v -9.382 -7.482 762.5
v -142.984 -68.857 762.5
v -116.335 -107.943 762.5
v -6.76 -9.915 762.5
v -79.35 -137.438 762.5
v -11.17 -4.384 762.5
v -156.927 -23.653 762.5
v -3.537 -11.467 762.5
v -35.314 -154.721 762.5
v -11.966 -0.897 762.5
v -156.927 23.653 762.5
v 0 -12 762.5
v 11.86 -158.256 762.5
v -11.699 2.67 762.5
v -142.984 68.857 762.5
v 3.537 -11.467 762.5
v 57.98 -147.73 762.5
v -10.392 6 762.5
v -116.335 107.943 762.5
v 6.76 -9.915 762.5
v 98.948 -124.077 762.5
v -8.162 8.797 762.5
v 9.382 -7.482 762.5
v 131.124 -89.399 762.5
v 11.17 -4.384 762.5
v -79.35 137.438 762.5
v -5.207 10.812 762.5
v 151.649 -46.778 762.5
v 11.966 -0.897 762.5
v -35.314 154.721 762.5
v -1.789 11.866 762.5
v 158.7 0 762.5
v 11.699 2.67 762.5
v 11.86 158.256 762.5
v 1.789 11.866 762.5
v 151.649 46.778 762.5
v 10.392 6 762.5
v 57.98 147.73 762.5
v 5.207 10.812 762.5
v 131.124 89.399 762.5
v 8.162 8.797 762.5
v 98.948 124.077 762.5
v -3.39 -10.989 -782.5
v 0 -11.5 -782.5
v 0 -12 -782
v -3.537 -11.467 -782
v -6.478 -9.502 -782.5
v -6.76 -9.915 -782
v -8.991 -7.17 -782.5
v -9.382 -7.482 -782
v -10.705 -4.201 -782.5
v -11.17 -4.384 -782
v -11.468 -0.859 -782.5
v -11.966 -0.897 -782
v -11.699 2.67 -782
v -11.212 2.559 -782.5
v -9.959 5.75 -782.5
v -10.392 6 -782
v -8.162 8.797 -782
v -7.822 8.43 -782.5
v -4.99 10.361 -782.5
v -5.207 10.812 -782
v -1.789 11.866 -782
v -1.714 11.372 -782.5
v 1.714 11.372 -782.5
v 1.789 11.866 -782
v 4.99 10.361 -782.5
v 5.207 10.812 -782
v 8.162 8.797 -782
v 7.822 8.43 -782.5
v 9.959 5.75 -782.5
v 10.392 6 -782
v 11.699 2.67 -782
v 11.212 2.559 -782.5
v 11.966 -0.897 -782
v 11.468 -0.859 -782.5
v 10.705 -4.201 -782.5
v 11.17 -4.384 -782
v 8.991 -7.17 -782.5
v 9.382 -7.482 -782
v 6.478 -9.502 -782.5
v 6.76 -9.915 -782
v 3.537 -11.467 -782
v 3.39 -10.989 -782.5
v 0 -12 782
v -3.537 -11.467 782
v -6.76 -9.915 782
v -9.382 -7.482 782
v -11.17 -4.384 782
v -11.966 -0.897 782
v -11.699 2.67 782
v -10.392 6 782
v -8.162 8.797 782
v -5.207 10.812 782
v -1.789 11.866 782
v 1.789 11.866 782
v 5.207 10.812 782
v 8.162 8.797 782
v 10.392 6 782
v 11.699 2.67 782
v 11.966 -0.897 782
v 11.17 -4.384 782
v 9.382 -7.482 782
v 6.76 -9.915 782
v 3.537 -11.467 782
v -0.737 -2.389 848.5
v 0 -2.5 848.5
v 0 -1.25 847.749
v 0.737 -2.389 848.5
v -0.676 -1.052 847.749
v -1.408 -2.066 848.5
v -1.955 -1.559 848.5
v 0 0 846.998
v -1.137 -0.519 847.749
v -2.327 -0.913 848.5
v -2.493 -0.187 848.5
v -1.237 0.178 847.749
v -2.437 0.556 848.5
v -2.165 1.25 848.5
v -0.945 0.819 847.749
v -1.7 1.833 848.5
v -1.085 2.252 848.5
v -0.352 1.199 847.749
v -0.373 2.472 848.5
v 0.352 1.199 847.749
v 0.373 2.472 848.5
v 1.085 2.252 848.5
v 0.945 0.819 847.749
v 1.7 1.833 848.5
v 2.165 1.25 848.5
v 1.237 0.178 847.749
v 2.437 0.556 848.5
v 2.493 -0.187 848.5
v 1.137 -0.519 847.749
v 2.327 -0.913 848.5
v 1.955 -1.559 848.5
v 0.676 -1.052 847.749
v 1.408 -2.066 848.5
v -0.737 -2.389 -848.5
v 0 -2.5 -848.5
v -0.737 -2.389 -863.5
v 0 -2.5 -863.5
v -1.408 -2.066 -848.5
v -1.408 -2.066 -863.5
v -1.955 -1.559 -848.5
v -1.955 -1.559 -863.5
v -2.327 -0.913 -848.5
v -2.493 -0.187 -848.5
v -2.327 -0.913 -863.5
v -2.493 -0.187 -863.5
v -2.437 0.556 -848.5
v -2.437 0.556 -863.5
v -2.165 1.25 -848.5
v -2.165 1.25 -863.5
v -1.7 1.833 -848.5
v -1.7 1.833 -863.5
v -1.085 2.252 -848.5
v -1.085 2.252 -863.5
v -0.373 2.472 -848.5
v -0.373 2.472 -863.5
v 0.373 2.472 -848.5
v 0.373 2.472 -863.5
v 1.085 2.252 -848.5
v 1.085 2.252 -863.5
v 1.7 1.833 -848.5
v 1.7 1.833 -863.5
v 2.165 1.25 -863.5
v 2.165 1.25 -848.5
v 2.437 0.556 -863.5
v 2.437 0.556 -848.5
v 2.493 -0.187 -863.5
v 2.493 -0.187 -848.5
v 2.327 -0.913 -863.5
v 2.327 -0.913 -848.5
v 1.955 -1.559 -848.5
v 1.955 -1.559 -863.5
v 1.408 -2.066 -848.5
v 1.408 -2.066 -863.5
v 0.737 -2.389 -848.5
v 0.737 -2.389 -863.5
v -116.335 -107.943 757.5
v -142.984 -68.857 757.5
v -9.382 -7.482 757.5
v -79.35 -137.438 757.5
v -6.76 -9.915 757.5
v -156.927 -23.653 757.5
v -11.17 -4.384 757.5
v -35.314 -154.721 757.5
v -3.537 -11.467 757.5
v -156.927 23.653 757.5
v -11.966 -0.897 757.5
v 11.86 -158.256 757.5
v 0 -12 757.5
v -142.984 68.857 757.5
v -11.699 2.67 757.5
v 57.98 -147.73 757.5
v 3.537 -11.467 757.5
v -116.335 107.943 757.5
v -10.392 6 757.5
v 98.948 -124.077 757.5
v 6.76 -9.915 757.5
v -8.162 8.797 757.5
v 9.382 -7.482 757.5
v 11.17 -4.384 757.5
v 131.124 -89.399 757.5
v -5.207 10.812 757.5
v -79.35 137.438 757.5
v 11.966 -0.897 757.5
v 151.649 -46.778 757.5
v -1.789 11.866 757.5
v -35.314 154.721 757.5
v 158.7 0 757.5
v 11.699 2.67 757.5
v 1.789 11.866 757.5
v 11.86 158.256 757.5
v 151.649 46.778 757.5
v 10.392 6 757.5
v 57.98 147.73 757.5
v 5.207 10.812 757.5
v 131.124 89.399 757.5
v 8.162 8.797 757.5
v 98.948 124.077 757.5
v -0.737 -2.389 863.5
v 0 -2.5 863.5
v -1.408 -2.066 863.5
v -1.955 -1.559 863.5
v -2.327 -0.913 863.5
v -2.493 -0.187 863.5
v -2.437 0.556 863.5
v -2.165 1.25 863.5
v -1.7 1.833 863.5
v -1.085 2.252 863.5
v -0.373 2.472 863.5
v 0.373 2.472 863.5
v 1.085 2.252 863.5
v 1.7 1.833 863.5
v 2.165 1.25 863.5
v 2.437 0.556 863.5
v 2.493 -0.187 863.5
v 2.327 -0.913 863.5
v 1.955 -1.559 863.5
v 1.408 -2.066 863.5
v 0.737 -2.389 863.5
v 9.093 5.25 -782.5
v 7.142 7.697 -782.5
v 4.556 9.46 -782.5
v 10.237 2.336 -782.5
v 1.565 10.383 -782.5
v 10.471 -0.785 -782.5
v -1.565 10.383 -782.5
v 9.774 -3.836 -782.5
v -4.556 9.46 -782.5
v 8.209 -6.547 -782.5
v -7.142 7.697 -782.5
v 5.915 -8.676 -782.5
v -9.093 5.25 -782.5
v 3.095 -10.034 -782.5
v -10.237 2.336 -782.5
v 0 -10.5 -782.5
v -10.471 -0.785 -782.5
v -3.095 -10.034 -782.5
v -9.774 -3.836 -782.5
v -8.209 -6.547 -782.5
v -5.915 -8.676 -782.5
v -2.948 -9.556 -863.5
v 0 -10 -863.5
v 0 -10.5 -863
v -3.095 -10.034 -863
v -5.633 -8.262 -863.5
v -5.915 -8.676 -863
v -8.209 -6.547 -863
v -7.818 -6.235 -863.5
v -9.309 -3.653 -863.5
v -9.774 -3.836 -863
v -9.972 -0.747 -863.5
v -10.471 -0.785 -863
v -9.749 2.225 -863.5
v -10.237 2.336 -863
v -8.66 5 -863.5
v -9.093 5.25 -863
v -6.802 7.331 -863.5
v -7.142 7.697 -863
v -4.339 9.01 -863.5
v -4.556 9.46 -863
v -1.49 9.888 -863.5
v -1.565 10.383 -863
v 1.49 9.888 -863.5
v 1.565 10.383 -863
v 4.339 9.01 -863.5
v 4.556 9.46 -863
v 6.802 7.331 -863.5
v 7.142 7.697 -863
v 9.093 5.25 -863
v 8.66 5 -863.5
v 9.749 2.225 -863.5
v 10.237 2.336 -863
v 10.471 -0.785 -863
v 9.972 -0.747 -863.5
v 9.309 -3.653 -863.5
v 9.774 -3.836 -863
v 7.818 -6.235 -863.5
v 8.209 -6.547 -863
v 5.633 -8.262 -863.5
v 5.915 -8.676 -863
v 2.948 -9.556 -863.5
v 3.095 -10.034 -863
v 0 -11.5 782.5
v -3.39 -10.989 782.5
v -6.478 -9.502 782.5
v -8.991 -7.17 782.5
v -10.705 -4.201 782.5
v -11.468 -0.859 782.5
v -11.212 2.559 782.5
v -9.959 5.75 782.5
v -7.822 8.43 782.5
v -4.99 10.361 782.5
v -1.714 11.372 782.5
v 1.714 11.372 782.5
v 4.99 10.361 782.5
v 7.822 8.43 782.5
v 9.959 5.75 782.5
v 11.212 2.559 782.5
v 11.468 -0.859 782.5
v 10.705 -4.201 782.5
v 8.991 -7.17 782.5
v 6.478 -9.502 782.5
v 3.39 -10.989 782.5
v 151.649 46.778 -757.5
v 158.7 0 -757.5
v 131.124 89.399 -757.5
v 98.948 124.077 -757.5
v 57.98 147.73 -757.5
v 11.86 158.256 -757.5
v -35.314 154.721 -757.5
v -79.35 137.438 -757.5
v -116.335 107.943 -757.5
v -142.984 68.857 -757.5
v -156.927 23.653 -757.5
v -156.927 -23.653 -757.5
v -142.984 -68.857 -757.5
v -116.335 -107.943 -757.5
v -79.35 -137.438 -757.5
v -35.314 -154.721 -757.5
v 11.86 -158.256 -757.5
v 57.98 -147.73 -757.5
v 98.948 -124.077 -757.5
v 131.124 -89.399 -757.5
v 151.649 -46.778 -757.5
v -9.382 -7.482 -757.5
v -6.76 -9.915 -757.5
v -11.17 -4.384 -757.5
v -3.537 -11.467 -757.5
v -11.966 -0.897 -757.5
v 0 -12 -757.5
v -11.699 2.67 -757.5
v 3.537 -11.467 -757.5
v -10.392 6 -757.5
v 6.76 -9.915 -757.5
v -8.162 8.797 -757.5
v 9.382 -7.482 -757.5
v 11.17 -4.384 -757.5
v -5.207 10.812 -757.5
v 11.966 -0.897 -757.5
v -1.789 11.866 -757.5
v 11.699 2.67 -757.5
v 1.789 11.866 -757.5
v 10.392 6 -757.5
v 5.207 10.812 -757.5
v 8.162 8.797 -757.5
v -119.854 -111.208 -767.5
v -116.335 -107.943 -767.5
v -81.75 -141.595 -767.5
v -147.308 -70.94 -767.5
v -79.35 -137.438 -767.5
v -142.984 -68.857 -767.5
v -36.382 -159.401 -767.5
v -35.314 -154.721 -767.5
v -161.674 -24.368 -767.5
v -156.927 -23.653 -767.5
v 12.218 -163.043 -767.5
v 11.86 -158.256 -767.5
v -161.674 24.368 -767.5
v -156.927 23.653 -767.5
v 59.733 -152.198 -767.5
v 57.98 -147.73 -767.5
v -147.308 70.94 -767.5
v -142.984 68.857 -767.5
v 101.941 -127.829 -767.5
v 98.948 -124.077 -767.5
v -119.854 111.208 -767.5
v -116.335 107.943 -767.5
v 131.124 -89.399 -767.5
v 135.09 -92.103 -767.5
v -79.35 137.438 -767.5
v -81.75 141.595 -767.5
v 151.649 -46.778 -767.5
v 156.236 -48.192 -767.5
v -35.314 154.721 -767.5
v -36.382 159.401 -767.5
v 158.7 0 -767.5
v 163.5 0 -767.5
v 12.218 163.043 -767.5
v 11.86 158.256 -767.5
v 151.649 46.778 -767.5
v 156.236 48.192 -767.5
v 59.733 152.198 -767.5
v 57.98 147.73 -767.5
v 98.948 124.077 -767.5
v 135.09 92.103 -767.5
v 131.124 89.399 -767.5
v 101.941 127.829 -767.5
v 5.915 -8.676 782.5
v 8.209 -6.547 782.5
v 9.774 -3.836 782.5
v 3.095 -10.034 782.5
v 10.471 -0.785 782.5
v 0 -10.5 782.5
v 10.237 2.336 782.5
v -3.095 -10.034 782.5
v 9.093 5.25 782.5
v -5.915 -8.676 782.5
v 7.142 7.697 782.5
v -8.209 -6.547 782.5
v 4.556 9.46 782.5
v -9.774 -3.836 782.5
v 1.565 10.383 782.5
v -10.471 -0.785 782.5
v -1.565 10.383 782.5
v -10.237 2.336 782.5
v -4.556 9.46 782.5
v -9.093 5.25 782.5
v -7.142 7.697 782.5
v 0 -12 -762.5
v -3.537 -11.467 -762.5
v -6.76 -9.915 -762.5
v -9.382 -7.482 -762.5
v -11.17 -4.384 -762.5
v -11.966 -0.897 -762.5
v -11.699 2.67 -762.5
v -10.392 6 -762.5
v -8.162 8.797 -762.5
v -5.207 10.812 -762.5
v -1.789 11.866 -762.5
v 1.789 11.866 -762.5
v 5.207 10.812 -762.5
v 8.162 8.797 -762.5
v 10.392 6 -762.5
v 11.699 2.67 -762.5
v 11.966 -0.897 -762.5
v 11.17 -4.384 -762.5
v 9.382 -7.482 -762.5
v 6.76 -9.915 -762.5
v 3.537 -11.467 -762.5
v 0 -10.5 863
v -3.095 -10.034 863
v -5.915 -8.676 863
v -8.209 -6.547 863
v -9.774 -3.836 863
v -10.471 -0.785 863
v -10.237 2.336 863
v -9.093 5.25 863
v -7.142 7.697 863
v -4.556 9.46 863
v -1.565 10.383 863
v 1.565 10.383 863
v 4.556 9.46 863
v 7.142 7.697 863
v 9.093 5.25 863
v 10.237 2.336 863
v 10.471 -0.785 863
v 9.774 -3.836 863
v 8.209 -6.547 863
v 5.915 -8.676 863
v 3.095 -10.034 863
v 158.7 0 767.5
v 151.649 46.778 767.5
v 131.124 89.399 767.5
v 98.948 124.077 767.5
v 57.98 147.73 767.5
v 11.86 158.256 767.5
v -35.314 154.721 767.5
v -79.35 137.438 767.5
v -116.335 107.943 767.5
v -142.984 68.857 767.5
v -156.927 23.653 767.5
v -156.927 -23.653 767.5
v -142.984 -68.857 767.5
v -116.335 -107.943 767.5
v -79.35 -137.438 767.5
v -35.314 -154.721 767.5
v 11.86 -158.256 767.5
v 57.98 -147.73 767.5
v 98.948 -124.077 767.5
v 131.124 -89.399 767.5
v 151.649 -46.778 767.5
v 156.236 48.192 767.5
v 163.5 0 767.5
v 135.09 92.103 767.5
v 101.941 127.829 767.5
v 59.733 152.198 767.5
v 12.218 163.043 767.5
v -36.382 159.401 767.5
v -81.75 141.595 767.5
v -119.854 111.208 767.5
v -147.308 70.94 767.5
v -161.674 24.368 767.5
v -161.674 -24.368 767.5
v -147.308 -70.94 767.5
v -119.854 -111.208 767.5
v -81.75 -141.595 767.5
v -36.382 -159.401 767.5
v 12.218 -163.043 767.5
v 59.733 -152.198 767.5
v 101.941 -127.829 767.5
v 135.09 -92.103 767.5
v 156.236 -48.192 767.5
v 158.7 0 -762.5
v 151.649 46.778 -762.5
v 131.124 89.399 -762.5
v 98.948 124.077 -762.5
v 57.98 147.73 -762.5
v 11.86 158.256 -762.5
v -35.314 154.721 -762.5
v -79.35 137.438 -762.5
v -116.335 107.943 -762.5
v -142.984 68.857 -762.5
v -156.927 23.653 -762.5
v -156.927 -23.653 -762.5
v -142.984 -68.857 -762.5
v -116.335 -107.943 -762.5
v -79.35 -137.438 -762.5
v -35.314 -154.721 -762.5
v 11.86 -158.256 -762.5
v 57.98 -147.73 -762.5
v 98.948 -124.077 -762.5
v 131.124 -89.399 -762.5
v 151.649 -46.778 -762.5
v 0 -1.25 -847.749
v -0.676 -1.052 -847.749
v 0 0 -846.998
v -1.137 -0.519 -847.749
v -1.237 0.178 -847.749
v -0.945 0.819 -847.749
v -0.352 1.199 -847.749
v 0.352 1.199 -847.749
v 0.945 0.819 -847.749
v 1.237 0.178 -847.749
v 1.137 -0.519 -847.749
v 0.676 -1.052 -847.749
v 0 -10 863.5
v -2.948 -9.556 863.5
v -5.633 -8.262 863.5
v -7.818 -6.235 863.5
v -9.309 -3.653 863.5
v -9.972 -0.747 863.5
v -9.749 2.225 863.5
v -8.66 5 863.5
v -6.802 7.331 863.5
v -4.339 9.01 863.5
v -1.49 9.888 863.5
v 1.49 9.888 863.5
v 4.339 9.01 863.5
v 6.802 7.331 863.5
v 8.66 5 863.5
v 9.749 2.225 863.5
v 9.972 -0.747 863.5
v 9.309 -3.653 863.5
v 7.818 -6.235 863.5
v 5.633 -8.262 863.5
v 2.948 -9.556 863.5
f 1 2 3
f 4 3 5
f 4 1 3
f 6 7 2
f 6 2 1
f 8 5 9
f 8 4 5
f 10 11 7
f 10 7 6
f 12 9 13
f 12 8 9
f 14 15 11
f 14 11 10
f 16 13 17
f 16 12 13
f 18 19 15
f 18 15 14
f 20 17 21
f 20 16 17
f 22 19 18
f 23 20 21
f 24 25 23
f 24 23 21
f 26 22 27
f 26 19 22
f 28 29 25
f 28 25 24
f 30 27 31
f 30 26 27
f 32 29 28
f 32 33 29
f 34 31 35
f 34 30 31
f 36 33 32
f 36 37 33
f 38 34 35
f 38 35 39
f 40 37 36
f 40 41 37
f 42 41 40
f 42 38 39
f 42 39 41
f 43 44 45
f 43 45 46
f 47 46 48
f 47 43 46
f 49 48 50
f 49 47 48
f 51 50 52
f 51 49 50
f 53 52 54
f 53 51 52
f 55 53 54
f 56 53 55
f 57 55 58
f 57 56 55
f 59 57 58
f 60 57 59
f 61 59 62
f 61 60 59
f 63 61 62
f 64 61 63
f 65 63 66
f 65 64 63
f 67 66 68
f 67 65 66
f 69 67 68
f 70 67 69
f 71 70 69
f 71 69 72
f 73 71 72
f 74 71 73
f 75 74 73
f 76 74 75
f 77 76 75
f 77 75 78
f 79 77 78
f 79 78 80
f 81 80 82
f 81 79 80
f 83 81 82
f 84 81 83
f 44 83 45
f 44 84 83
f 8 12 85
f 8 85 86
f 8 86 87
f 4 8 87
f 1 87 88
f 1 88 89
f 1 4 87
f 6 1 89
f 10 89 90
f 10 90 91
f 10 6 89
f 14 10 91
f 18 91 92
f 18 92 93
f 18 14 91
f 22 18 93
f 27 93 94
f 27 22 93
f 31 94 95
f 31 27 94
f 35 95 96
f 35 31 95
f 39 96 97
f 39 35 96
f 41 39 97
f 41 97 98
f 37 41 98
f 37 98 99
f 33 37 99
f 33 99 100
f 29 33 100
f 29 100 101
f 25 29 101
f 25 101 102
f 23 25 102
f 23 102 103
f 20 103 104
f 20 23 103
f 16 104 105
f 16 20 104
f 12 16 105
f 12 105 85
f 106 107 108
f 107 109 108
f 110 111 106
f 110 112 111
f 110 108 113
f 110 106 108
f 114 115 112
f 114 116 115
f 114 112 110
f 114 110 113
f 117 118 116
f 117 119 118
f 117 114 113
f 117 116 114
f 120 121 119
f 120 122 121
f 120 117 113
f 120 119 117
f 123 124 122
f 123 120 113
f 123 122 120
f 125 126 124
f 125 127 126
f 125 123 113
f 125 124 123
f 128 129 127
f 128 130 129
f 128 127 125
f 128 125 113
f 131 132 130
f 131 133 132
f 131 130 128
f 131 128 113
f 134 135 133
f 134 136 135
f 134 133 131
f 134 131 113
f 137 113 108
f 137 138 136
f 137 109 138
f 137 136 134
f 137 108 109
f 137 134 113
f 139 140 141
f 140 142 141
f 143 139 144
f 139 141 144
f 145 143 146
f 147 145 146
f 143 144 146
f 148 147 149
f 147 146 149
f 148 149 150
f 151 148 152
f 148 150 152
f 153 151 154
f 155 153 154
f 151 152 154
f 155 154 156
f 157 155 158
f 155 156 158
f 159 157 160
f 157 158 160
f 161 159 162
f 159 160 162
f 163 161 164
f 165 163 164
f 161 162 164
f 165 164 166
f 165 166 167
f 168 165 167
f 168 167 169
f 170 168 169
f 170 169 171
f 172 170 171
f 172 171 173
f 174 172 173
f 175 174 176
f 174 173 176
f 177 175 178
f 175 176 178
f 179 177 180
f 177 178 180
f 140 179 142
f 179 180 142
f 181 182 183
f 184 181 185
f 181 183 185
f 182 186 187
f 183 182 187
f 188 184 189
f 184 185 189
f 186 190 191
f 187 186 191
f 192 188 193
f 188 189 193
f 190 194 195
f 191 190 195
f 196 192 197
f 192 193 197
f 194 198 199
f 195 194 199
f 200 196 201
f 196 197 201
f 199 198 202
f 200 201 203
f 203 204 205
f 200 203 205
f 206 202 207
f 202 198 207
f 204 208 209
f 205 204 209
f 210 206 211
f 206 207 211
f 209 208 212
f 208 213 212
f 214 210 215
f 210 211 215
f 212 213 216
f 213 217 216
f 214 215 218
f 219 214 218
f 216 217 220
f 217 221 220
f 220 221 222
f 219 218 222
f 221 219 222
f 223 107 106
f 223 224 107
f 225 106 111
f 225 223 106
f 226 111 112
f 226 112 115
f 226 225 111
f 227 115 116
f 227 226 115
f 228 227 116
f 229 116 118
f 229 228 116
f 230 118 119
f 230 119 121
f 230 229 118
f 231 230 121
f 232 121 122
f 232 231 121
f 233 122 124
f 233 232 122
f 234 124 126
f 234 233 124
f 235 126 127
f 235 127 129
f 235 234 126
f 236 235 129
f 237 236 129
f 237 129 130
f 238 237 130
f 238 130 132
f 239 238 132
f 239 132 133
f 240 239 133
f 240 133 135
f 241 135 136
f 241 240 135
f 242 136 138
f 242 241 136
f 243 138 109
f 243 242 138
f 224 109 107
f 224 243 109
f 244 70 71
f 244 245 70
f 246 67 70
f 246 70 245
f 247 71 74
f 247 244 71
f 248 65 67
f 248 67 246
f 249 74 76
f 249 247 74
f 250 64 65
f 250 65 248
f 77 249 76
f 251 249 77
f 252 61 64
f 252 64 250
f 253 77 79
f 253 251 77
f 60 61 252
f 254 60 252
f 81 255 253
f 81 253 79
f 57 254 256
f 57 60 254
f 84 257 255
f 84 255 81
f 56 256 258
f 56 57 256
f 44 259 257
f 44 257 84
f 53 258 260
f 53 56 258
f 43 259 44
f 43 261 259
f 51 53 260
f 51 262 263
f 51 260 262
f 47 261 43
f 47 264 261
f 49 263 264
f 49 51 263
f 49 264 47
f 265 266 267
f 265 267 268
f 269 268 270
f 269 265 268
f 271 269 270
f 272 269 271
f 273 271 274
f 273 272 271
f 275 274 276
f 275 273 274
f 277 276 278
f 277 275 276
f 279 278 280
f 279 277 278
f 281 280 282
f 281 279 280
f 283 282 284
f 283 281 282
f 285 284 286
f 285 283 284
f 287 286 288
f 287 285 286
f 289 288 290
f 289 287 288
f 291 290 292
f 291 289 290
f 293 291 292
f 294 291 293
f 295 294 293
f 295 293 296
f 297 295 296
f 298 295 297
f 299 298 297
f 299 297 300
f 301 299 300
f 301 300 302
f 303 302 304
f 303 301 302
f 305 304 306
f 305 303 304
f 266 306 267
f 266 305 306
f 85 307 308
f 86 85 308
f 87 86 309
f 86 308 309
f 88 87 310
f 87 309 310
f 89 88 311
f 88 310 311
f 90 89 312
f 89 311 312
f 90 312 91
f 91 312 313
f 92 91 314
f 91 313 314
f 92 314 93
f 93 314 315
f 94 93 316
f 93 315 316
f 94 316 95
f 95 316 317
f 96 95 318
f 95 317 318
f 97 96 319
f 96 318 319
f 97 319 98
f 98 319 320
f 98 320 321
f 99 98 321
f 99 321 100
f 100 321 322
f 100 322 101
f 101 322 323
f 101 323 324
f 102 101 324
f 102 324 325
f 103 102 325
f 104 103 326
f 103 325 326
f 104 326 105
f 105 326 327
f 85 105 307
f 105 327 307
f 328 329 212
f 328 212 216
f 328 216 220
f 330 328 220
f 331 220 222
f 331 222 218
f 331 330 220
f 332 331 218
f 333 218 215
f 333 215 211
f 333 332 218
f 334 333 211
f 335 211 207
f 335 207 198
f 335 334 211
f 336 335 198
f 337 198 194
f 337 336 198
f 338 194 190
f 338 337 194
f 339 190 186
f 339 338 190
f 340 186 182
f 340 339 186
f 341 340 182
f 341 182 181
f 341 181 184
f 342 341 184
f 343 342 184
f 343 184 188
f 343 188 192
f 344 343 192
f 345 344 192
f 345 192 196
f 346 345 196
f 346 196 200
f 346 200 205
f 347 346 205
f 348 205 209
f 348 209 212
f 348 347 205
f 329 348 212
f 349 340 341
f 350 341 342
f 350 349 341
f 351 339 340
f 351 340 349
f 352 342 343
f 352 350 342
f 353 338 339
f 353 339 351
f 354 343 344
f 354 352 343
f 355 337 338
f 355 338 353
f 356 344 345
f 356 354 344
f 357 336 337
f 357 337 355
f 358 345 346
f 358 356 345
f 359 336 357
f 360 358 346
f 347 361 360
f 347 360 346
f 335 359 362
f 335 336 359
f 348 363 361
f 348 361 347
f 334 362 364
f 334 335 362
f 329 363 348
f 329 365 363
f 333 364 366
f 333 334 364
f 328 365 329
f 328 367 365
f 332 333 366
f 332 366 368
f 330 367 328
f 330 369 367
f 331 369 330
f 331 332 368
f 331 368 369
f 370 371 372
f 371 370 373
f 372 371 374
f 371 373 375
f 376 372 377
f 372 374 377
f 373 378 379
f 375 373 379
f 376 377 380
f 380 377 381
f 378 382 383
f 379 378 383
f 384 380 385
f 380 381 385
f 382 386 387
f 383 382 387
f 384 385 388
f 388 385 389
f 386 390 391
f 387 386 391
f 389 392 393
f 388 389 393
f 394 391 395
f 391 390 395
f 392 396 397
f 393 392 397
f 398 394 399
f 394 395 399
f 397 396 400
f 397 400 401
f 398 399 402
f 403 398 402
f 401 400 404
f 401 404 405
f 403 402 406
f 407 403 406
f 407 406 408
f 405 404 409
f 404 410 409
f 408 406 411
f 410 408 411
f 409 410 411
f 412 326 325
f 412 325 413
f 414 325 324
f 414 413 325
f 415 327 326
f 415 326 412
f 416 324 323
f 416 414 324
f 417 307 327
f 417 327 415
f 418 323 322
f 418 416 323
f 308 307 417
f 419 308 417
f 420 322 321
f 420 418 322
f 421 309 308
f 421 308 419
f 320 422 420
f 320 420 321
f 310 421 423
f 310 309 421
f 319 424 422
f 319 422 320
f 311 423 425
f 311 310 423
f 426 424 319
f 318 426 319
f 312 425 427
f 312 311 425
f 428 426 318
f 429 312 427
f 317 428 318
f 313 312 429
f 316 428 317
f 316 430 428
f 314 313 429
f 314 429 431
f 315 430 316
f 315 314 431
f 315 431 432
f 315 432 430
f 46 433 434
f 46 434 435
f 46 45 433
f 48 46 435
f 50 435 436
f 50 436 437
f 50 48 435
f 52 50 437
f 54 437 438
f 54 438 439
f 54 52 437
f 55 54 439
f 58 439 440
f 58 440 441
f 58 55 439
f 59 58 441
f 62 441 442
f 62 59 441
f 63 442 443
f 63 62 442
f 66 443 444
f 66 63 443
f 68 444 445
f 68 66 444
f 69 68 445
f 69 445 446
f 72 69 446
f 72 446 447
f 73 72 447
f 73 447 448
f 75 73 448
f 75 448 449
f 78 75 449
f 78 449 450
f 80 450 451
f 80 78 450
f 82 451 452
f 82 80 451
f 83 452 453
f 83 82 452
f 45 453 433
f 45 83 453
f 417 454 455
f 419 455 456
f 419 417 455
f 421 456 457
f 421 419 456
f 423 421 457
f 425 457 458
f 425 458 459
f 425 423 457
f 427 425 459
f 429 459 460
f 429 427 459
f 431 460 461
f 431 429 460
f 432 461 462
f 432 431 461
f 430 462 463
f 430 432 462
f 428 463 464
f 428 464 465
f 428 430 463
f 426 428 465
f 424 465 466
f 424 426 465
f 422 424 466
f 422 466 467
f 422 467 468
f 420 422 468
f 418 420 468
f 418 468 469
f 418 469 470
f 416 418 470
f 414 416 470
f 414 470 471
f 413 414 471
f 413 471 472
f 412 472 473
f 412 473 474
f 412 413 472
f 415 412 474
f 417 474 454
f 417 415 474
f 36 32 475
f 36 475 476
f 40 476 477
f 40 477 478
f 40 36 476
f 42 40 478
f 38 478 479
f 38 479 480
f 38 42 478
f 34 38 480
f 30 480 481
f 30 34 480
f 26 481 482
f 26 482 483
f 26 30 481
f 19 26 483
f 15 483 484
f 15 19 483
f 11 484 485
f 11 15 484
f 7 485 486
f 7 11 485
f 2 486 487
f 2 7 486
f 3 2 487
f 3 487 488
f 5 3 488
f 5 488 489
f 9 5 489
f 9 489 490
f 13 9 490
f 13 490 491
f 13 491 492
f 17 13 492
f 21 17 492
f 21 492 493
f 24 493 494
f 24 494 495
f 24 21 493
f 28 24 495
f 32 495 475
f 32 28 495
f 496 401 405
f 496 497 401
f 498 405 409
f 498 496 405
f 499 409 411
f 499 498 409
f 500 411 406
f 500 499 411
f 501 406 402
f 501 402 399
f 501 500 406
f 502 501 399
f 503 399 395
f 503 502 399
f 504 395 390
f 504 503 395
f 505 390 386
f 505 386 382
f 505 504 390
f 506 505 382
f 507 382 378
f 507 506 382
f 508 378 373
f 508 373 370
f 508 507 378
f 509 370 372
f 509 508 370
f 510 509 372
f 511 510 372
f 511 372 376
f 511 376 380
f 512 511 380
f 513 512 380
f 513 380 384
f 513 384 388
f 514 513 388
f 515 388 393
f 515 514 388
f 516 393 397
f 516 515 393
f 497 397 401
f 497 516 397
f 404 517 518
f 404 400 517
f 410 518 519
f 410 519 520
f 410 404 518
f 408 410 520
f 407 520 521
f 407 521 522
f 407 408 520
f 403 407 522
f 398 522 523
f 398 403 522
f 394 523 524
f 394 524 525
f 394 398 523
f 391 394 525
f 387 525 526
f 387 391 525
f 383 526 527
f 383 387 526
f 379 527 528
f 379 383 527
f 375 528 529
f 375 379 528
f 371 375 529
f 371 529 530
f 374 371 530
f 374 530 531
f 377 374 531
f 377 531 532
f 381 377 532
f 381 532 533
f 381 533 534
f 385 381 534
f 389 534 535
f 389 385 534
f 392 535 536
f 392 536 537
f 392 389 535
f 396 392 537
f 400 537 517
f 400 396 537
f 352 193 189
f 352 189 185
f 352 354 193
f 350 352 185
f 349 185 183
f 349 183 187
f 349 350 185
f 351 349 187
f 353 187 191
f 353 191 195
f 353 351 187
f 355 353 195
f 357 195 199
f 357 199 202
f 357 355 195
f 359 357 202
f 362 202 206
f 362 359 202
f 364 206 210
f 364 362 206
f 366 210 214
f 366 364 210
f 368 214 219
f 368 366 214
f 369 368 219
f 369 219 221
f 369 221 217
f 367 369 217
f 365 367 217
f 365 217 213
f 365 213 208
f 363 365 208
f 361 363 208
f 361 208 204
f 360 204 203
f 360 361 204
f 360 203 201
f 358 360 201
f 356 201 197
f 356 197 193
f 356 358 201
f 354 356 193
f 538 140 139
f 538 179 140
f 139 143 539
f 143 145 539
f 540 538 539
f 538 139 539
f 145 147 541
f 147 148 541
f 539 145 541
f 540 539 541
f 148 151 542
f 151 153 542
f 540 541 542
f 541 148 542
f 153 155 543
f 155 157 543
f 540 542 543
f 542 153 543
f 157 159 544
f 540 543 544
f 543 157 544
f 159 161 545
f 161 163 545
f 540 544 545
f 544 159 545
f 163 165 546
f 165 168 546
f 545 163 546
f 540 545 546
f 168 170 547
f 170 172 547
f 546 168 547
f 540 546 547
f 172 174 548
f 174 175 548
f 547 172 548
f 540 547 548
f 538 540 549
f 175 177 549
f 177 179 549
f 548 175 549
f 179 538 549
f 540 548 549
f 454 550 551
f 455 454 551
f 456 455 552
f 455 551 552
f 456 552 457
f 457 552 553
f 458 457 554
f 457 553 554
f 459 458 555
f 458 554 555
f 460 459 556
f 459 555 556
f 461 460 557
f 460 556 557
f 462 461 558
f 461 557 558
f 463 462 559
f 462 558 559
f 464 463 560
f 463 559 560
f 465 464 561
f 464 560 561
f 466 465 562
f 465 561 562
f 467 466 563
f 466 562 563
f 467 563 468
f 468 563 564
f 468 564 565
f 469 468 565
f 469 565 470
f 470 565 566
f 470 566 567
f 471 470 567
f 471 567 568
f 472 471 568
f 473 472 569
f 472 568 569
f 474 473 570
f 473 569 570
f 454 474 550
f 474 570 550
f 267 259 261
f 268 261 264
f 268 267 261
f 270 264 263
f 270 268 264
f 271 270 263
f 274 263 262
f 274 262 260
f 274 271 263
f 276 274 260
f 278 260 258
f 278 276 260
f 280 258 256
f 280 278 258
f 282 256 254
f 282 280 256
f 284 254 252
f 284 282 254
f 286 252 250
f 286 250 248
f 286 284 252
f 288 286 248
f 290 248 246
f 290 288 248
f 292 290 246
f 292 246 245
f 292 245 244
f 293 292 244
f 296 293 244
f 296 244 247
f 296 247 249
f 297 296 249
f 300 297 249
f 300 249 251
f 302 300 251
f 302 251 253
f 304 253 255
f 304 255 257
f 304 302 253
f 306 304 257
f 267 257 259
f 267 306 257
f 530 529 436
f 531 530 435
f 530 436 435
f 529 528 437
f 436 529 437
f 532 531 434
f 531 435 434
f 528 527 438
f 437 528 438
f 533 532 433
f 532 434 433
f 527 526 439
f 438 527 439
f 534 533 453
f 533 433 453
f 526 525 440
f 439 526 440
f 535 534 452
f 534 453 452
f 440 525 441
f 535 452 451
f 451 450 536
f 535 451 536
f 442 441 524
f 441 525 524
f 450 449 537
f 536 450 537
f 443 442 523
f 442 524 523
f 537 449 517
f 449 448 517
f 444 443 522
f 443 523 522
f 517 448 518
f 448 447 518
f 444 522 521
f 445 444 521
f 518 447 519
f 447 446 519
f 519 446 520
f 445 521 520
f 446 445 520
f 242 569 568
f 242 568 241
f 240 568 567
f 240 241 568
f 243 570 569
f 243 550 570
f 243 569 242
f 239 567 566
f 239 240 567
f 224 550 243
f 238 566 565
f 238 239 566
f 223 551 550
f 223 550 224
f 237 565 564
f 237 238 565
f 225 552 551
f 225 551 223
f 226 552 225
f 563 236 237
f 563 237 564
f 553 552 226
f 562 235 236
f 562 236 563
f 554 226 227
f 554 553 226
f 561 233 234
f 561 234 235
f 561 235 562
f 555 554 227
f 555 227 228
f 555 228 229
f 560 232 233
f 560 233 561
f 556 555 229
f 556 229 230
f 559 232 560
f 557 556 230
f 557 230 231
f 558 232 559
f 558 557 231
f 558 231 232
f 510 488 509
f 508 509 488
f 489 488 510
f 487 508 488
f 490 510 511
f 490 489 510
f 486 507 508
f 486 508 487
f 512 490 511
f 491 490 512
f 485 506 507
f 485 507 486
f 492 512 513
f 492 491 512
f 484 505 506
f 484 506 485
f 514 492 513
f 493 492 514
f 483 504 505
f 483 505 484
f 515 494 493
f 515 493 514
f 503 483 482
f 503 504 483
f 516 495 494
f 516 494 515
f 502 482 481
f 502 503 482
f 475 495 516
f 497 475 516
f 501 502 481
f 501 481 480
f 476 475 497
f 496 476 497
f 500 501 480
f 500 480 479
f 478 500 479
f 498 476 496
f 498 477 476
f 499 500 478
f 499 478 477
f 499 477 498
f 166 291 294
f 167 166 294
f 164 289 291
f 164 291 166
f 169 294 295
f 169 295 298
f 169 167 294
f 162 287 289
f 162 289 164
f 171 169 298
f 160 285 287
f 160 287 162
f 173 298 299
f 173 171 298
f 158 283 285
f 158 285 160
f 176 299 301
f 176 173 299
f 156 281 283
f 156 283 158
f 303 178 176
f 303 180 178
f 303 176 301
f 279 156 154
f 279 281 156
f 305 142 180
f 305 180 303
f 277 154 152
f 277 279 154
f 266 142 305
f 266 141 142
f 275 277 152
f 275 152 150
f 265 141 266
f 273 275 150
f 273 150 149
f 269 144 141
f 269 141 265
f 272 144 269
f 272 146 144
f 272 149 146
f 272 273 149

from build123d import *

# Parameters (mm, degrees)
SKETCH1_R           = 163.5
SKETCH1_R_2         = 158.7
BOSS_EXTRUDE1_DEPTH = 767.5
BOSS_EXTRUDE2_START = -10
SKETCH2_R           = 158.7
BOSS_EXTRUDE2_DEPTH = 5
CHAMFER1_SIZE       = 0.5


with BuildPart() as part:
    # Sketch1 → Boss-Extrude1 (new, symmetric)
    with BuildSketch(Plane.XY):
        Circle(SKETCH1_R)
        Circle(SKETCH1_R_2, mode=Mode.SUBTRACT)
    extrude(amount=BOSS_EXTRUDE1_DEPTH, both=True)

    # Sketch2 → Boss-Extrude2 (add)
    with BuildSketch(Plane.XY.offset(767.5).offset(BOSS_EXTRUDE2_START)):
        Circle(SKETCH2_R)
    boss_extrude2 = extrude(amount=BOSS_EXTRUDE2_DEPTH)

    # Sketch5 → Revolve1 (revolve)
    with BuildSketch(Plane(origin=(0, 0, 0), x_dir=(0, 0, -1), z_dir=(1, 0, 0)), mode=Mode.PRIVATE) as revolve1_sk:
        Polygon((-782.5, 12), (782.5, 12), (782.5, 10.5), (863.5, 10.5), (863.5, 0), (-863.5, 0), (-863.5, 10.5), (-782.5, 10.5), align=None)
    revolve(revolve1_sk.sketch.rotate(Axis((0, 0, -863.5), (0, 0, -1)), 180), axis=Axis((0, 0, -863.5), (0, 0, -1)))

    # Chamfer1
    chamfer1_edges = [part.edges().sort_by_distance(p)[0] for p in [
        (0, 12, -782.5),
        (0, 12, 782.5),
        (0, 10.5, -863.5),
        (0, 10.5, 863.5),
    ]]
    chamfer(chamfer1_edges, length=CHAMFER1_SIZE)

    # Sketch7 → M6 Tapped Hole1 (revolve, cut)
    with BuildSketch(Plane(origin=(0, 0, 863.5), x_dir=(0, -1, 0), z_dir=(1, 0, 0))):
        Polygon((0, 0), (0, 16.502151548), (2.5, 15), (2.5, 0), align=None)
    m6_tapped_hole1 = revolve(axis=Axis((0, 0, 869.85), (0, 0, -1)), mode=Mode.SUBTRACT)

    # Mirror3: Boss-Extrude2, M6 Tapped Hole1 across plane
    add(boss_extrude2.mirror(Plane.XY))
    add(m6_tapped_hole1.mirror(Plane.XY), mode=Mode.SUBTRACT)


solid = part.part
